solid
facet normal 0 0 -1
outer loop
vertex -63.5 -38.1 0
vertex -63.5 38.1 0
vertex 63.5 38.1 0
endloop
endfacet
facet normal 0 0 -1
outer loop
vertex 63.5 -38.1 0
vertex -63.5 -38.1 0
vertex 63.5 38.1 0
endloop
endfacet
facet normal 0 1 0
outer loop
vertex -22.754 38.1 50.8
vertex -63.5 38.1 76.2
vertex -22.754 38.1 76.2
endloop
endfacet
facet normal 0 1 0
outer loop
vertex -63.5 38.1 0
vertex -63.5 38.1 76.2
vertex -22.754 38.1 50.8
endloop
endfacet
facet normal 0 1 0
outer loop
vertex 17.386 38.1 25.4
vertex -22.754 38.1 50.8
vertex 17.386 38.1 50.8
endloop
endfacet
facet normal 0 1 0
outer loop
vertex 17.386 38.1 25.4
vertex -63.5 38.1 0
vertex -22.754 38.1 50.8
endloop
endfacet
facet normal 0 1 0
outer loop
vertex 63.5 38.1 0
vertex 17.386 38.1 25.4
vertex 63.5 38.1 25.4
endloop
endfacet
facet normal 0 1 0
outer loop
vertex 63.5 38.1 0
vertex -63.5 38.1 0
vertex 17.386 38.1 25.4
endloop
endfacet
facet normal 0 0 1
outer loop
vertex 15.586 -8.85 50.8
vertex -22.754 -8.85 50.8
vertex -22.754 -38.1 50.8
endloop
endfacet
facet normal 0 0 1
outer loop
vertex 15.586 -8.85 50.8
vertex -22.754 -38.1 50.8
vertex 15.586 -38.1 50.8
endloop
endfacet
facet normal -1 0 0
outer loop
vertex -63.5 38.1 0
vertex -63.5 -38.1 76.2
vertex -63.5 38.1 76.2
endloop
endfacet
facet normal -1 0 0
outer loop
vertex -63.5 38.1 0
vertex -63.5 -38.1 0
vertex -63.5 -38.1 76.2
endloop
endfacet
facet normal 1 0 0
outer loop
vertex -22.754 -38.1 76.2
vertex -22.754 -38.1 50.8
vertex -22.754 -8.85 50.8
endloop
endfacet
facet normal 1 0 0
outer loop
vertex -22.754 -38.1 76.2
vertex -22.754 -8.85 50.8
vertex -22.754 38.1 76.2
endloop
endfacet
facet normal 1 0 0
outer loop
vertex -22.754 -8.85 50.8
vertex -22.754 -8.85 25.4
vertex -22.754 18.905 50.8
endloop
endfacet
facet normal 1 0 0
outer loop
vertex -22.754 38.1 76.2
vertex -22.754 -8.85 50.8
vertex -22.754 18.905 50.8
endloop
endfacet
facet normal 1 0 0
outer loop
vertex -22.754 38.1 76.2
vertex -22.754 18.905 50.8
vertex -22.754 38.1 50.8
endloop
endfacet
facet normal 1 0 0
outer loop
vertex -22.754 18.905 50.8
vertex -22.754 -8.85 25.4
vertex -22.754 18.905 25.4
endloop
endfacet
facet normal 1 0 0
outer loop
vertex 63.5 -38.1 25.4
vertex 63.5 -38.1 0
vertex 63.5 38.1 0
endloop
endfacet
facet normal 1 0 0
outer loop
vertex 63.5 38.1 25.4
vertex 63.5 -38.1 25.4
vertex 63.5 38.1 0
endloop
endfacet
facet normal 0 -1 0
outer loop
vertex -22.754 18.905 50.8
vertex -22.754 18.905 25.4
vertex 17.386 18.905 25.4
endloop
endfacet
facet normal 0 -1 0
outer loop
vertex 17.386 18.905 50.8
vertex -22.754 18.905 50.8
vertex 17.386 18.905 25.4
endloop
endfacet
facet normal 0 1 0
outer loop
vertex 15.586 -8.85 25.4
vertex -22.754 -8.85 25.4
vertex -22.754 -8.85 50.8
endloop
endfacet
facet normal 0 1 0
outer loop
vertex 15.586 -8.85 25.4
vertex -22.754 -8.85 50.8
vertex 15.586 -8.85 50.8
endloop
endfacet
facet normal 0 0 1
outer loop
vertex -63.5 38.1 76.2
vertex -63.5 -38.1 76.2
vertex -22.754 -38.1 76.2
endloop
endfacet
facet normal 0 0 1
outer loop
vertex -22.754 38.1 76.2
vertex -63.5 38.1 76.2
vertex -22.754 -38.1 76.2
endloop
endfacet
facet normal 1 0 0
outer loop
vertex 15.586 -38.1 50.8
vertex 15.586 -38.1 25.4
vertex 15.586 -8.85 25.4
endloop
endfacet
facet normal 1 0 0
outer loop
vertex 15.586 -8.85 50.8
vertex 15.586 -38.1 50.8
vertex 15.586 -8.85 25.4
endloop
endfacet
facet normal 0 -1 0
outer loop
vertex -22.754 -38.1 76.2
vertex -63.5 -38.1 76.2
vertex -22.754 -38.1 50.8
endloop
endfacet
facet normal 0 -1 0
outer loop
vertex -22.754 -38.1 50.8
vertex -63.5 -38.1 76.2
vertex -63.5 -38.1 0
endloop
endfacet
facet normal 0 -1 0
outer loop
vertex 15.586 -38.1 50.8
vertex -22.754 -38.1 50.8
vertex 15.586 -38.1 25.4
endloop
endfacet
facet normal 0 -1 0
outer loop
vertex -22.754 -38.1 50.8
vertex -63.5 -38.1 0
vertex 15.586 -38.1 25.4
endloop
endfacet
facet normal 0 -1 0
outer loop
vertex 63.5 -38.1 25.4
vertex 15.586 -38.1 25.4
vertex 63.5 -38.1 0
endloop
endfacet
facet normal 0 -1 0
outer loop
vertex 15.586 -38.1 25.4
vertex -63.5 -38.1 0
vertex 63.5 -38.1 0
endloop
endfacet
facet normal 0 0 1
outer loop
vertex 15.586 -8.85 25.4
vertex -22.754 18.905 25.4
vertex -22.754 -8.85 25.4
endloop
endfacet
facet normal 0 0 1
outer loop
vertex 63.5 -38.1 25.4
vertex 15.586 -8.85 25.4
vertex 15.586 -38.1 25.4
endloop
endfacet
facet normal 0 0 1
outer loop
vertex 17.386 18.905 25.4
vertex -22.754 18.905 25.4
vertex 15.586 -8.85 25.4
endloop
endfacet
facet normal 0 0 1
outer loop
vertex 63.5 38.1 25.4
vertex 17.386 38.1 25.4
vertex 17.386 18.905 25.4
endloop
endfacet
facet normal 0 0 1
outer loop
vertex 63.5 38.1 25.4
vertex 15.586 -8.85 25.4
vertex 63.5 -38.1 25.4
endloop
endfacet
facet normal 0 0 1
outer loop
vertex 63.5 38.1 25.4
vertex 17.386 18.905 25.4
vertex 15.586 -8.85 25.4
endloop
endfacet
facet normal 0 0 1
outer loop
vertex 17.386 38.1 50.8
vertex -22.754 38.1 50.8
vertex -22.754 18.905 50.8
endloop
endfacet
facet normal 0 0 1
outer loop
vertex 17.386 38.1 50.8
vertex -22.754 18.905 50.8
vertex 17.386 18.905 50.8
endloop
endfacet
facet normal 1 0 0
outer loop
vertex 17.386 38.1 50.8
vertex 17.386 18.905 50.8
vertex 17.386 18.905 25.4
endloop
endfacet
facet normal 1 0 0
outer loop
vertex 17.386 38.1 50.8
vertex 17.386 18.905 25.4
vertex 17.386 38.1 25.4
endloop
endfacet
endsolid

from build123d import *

# Parameters (mm, degrees)
F0_W     = 127
F0_H     = 76.2
F1_DEPTH = 25.4
F2_W     = 40.7456940264
F2_H     = 76.2
F3_DEPTH = 50.8
F4_W     = 40.1406884193
F4_H     = 19.1947049409
F5_DEPTH = 25.4
F6_W     = 38.3402202278
F6_H     = 29.2502096802
F7_DEPTH = 25.4


with BuildPart() as f1:
    # F0 (on Top) → F1 (new body)
    with BuildSketch(Plane.XY):
        Rectangle(F0_W, F0_H)
    extrude(amount=F1_DEPTH)

    # F2 (on face) → F3 (join)
    with BuildSketch(Plane.XY.offset(25.4)):
        with Locations((-43.1271529868, 0)):
            Rectangle(F2_W, F2_H)
    extrude(amount=F3_DEPTH)

    # F4 (on face) → F5 (join)
    with BuildSketch(Plane.XY.offset(25.4)):
        with Locations((-2.683961764, 28.5026475295)):
            Rectangle(F4_W, F4_H)
    extrude(amount=F5_DEPTH)

    # F6 (on face) → F7 (join)
    with BuildSketch(Plane.XY.offset(25.4)):
        with Locations((-3.5841958597, -23.4748951599)):
            Rectangle(F6_W, F6_H)
    extrude(amount=F7_DEPTH)


solid = f1.part
